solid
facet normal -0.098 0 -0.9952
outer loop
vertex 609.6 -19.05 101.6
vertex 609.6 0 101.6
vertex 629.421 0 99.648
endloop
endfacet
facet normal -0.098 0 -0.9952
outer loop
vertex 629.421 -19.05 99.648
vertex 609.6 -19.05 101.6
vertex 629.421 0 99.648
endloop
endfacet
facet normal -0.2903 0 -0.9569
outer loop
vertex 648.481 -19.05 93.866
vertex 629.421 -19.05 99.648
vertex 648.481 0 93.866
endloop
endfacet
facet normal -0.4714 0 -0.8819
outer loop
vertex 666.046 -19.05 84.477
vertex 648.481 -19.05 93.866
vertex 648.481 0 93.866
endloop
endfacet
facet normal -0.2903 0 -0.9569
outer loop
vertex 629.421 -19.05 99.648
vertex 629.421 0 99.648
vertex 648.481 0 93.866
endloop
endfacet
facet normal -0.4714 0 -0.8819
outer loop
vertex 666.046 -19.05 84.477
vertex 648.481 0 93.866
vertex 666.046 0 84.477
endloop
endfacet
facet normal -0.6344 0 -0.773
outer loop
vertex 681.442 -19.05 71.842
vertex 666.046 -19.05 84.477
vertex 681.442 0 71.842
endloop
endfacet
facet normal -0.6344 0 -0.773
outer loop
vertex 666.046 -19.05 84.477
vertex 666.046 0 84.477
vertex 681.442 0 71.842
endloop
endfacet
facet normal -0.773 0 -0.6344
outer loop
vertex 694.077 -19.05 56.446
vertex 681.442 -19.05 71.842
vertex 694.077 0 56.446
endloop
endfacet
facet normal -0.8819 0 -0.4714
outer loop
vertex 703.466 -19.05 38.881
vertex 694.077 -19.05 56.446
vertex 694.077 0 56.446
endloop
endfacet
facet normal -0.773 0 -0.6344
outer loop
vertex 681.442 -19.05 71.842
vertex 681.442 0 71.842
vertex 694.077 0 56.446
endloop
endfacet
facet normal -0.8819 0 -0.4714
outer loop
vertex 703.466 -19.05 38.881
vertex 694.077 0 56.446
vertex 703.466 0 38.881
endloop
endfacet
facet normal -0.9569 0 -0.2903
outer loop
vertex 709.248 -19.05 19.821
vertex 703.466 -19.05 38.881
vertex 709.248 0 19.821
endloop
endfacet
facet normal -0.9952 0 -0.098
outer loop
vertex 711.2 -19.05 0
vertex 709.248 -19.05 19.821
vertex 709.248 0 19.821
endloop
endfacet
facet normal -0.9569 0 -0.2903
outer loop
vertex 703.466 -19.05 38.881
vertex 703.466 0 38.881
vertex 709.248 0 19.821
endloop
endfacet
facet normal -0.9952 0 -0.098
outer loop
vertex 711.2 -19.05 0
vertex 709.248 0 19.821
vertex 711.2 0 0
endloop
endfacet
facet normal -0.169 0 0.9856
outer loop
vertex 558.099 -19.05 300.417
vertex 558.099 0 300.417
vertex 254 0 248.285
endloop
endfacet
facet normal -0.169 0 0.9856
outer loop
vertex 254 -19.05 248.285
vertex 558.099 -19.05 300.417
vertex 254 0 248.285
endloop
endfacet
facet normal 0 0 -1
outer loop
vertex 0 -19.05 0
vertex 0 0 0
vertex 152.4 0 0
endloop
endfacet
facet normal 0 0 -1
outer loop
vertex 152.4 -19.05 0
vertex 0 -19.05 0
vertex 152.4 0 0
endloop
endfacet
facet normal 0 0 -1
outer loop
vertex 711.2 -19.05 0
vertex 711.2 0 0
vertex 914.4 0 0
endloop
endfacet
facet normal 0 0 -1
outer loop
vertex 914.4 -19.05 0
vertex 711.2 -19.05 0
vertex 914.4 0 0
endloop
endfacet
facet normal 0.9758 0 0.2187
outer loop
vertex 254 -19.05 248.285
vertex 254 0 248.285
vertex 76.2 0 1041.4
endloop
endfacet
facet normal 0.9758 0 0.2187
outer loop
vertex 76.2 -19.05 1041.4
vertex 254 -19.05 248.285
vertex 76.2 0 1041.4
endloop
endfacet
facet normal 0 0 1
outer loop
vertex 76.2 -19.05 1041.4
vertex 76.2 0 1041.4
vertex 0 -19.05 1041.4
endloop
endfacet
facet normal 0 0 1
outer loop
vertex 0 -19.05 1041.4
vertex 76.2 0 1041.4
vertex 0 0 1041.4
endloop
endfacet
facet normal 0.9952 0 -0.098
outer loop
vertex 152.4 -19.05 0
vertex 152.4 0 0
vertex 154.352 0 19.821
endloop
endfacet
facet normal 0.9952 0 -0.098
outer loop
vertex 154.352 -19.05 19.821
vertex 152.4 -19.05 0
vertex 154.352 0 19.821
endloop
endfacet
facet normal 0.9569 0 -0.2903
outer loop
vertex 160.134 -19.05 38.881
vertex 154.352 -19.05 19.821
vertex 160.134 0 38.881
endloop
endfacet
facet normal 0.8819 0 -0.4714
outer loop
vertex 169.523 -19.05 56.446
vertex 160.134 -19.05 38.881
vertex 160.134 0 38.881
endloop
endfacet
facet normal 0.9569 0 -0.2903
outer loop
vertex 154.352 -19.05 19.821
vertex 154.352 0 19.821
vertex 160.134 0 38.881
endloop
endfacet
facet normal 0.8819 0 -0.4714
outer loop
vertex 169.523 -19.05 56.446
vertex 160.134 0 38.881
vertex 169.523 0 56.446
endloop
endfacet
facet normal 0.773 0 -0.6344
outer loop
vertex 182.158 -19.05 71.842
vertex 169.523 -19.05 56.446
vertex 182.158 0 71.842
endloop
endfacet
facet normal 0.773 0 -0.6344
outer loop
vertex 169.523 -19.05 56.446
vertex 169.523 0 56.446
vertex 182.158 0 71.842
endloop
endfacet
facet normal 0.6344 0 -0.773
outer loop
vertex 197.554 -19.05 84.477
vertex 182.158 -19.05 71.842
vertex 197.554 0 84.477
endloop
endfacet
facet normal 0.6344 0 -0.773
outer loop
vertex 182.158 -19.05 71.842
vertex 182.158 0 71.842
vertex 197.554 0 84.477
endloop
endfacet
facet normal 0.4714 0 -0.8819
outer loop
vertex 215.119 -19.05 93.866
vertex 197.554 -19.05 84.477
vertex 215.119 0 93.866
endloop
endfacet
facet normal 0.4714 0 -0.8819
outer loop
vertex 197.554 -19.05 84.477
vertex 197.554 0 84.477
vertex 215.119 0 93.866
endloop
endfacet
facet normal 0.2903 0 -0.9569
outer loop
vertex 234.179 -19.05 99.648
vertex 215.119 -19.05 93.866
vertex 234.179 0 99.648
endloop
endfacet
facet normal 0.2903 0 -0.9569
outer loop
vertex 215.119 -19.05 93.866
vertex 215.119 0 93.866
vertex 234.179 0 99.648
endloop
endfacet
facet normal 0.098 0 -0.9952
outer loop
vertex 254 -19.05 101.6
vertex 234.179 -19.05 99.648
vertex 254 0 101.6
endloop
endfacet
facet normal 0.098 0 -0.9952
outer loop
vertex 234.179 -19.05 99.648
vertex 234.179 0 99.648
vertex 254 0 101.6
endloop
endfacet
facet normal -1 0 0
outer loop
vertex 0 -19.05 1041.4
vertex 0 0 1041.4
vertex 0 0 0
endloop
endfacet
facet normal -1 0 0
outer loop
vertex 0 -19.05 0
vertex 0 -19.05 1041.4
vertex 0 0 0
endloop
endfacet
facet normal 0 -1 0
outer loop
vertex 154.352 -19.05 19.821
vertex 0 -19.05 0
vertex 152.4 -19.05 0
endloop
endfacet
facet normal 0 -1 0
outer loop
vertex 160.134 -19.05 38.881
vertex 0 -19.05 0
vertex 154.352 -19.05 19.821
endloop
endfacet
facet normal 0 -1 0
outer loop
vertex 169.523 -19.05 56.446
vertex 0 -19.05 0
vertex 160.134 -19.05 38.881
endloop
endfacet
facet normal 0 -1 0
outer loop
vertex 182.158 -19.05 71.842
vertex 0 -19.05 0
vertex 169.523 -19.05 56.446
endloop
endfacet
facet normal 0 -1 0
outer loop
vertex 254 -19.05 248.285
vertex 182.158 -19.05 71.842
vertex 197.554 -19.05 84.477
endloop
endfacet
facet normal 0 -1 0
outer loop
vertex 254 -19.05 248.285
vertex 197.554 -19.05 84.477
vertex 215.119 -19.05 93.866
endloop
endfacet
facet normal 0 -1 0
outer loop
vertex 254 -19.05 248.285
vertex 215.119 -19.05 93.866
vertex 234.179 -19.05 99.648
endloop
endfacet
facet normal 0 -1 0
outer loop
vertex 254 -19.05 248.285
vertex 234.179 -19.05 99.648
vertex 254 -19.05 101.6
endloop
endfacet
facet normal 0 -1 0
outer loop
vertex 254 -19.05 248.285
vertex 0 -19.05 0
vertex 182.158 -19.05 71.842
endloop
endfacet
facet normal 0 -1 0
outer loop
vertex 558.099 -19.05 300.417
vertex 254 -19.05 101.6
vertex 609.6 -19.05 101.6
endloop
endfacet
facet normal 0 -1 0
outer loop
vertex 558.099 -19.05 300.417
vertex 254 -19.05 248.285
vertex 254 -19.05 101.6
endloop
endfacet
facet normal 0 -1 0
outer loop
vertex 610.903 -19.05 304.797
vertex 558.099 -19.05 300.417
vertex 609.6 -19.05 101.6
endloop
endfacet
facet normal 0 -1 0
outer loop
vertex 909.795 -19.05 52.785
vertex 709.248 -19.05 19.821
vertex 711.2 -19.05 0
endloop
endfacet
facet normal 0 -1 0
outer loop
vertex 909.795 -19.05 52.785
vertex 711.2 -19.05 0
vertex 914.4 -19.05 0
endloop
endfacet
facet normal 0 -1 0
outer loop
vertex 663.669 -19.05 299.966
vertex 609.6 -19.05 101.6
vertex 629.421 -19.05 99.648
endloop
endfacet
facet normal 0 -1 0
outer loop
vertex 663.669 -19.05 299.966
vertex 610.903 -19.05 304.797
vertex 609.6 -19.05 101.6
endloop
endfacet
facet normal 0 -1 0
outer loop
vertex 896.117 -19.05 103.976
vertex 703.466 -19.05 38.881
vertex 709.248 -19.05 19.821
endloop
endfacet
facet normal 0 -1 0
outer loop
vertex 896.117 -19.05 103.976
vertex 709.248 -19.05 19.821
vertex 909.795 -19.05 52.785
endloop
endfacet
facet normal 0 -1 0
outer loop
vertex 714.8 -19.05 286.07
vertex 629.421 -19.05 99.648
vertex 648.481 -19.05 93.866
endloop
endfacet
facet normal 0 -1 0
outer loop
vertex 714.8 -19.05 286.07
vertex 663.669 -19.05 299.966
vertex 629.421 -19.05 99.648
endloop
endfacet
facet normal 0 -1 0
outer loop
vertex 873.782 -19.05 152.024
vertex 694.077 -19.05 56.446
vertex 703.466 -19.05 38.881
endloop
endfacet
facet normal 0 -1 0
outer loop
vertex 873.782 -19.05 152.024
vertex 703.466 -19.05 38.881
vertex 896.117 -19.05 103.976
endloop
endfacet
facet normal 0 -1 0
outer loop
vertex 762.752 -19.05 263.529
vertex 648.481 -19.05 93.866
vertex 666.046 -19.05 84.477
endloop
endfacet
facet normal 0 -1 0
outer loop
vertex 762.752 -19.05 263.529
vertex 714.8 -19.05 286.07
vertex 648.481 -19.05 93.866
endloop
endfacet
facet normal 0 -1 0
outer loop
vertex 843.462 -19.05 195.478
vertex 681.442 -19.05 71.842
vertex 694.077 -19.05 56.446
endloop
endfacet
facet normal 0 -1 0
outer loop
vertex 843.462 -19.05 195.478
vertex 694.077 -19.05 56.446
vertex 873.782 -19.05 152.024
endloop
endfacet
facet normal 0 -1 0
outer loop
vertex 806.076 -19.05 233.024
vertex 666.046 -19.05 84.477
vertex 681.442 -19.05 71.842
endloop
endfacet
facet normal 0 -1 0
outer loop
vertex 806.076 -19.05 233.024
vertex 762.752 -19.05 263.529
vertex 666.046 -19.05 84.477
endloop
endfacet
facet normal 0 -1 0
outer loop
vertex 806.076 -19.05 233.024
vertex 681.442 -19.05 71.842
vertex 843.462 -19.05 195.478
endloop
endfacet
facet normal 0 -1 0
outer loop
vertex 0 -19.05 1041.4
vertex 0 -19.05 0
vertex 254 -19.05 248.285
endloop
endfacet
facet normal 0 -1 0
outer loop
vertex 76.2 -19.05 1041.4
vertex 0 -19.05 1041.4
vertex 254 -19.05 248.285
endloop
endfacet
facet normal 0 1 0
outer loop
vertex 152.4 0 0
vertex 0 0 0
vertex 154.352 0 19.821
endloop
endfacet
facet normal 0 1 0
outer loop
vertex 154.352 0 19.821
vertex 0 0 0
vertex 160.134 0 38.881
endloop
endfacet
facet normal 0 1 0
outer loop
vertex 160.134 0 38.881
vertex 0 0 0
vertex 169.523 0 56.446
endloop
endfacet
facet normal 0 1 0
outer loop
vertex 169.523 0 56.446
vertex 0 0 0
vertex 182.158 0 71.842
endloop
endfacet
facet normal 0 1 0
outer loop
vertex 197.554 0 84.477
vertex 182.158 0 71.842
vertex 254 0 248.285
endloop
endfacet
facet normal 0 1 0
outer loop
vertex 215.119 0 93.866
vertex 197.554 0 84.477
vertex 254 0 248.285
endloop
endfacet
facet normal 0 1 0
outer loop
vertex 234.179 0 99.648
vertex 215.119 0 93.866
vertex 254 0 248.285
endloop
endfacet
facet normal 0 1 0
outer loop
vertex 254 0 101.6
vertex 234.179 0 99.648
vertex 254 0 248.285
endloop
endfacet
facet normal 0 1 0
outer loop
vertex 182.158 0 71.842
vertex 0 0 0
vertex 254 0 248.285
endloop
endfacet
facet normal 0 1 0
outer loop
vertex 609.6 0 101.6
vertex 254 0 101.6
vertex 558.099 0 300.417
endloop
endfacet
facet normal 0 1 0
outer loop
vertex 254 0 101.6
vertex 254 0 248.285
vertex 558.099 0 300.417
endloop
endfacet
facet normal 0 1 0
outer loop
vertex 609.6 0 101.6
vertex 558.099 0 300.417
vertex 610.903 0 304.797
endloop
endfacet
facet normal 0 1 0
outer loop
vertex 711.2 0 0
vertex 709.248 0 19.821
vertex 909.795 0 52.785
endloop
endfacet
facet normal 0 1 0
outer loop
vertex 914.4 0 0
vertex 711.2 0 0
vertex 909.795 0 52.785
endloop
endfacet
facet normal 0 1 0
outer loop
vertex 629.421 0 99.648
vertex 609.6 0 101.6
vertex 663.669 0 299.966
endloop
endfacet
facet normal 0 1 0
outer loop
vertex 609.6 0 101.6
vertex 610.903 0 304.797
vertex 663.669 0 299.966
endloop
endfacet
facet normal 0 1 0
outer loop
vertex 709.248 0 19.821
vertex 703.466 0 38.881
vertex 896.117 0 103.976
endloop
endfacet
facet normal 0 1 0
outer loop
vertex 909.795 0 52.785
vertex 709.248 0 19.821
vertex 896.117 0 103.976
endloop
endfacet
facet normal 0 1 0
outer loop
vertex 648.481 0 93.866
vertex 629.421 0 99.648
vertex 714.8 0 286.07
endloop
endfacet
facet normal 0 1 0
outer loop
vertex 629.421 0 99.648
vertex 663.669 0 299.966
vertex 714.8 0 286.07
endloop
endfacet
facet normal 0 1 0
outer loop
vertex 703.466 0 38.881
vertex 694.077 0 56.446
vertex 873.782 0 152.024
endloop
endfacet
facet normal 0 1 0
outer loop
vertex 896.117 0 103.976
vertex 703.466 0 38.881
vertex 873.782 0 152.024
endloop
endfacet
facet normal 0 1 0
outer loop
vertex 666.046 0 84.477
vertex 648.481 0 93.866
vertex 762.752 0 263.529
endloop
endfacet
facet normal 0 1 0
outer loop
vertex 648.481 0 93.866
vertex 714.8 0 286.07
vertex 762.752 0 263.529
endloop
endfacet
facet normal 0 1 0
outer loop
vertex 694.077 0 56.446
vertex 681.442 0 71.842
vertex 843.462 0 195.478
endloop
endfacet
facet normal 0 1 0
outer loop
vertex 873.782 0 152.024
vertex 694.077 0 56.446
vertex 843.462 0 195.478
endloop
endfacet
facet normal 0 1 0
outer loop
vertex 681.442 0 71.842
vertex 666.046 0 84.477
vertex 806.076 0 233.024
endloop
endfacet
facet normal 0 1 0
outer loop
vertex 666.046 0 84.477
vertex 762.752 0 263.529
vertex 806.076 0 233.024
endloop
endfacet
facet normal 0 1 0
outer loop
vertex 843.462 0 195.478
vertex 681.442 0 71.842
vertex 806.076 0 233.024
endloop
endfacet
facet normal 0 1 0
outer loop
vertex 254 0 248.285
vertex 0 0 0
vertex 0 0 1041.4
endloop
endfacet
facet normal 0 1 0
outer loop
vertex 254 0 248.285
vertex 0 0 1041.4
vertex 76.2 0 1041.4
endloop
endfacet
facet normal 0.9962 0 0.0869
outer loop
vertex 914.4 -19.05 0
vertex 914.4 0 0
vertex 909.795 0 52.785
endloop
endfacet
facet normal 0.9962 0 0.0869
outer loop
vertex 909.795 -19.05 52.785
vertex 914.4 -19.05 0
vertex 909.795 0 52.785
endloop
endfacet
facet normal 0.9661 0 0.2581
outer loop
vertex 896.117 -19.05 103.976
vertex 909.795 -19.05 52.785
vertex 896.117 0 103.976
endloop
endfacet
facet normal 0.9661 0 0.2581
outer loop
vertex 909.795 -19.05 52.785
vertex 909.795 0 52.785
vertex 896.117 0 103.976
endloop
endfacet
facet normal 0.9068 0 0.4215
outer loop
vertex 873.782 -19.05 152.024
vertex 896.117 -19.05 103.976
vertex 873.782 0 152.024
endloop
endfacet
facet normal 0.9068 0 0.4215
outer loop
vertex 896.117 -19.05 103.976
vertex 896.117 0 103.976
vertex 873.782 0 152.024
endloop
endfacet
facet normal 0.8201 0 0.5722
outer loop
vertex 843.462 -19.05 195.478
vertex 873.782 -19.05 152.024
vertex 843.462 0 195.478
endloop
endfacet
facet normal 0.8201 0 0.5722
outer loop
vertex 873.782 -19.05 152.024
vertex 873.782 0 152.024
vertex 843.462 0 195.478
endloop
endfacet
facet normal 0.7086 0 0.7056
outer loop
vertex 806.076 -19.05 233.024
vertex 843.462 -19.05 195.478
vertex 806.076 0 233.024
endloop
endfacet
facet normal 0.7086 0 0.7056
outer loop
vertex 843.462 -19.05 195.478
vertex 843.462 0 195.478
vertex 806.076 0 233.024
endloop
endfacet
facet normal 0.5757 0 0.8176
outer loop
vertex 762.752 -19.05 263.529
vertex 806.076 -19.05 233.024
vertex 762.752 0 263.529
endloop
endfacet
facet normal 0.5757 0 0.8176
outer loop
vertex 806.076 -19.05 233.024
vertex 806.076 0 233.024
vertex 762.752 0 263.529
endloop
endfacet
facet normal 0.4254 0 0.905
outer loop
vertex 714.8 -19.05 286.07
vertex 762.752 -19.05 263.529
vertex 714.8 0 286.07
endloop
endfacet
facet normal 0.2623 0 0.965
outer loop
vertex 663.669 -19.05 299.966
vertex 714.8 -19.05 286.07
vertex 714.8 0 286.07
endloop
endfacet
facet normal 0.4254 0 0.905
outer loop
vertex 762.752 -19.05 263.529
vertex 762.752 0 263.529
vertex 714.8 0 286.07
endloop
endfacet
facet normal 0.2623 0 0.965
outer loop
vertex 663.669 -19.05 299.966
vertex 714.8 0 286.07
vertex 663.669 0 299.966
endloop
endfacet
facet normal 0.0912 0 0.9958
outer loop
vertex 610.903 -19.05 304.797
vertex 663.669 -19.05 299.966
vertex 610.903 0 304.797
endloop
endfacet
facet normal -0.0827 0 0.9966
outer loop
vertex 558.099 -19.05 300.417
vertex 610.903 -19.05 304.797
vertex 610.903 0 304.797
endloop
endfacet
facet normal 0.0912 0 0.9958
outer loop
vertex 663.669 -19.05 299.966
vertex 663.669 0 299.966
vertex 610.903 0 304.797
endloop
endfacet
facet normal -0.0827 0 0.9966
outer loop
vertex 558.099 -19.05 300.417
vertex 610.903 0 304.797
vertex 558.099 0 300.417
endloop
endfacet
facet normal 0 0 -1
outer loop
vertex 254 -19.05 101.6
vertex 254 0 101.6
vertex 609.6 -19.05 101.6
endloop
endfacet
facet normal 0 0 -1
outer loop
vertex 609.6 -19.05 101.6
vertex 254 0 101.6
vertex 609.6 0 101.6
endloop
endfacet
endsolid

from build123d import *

# Parameters (mm, degrees)
F1_DEPTH = 19.05


with BuildPart() as f1:
    # F0 (on Front) → F1 (new body)
    with BuildSketch(Plane.XZ):
        with BuildLine():
            Line((0, 1041.4), (0, 0))
            Line((0, 0), (152.4, 0))
            ThreePointArc((152.4, 0), (182.157951, 71.842049), (254, 101.6))
            Line((254, 101.6), (609.6, 101.6))
            ThreePointArc((609.6, 101.6), (681.442049, 71.842049), (711.2, 0))
            Line((711.2, 0), (914.4, 0))
            ThreePointArc((914.4, 0), (806.075816, 233.024234), (558.09886, 300.417497))
            Line((558.09886, 300.417497), (254, 248.285254))
            Line((254, 248.285254), (76.2, 1041.4))
            Line((76.2, 1041.4), (0, 1041.4))
        make_face()
    extrude(amount=F1_DEPTH)


solid = f1.part
